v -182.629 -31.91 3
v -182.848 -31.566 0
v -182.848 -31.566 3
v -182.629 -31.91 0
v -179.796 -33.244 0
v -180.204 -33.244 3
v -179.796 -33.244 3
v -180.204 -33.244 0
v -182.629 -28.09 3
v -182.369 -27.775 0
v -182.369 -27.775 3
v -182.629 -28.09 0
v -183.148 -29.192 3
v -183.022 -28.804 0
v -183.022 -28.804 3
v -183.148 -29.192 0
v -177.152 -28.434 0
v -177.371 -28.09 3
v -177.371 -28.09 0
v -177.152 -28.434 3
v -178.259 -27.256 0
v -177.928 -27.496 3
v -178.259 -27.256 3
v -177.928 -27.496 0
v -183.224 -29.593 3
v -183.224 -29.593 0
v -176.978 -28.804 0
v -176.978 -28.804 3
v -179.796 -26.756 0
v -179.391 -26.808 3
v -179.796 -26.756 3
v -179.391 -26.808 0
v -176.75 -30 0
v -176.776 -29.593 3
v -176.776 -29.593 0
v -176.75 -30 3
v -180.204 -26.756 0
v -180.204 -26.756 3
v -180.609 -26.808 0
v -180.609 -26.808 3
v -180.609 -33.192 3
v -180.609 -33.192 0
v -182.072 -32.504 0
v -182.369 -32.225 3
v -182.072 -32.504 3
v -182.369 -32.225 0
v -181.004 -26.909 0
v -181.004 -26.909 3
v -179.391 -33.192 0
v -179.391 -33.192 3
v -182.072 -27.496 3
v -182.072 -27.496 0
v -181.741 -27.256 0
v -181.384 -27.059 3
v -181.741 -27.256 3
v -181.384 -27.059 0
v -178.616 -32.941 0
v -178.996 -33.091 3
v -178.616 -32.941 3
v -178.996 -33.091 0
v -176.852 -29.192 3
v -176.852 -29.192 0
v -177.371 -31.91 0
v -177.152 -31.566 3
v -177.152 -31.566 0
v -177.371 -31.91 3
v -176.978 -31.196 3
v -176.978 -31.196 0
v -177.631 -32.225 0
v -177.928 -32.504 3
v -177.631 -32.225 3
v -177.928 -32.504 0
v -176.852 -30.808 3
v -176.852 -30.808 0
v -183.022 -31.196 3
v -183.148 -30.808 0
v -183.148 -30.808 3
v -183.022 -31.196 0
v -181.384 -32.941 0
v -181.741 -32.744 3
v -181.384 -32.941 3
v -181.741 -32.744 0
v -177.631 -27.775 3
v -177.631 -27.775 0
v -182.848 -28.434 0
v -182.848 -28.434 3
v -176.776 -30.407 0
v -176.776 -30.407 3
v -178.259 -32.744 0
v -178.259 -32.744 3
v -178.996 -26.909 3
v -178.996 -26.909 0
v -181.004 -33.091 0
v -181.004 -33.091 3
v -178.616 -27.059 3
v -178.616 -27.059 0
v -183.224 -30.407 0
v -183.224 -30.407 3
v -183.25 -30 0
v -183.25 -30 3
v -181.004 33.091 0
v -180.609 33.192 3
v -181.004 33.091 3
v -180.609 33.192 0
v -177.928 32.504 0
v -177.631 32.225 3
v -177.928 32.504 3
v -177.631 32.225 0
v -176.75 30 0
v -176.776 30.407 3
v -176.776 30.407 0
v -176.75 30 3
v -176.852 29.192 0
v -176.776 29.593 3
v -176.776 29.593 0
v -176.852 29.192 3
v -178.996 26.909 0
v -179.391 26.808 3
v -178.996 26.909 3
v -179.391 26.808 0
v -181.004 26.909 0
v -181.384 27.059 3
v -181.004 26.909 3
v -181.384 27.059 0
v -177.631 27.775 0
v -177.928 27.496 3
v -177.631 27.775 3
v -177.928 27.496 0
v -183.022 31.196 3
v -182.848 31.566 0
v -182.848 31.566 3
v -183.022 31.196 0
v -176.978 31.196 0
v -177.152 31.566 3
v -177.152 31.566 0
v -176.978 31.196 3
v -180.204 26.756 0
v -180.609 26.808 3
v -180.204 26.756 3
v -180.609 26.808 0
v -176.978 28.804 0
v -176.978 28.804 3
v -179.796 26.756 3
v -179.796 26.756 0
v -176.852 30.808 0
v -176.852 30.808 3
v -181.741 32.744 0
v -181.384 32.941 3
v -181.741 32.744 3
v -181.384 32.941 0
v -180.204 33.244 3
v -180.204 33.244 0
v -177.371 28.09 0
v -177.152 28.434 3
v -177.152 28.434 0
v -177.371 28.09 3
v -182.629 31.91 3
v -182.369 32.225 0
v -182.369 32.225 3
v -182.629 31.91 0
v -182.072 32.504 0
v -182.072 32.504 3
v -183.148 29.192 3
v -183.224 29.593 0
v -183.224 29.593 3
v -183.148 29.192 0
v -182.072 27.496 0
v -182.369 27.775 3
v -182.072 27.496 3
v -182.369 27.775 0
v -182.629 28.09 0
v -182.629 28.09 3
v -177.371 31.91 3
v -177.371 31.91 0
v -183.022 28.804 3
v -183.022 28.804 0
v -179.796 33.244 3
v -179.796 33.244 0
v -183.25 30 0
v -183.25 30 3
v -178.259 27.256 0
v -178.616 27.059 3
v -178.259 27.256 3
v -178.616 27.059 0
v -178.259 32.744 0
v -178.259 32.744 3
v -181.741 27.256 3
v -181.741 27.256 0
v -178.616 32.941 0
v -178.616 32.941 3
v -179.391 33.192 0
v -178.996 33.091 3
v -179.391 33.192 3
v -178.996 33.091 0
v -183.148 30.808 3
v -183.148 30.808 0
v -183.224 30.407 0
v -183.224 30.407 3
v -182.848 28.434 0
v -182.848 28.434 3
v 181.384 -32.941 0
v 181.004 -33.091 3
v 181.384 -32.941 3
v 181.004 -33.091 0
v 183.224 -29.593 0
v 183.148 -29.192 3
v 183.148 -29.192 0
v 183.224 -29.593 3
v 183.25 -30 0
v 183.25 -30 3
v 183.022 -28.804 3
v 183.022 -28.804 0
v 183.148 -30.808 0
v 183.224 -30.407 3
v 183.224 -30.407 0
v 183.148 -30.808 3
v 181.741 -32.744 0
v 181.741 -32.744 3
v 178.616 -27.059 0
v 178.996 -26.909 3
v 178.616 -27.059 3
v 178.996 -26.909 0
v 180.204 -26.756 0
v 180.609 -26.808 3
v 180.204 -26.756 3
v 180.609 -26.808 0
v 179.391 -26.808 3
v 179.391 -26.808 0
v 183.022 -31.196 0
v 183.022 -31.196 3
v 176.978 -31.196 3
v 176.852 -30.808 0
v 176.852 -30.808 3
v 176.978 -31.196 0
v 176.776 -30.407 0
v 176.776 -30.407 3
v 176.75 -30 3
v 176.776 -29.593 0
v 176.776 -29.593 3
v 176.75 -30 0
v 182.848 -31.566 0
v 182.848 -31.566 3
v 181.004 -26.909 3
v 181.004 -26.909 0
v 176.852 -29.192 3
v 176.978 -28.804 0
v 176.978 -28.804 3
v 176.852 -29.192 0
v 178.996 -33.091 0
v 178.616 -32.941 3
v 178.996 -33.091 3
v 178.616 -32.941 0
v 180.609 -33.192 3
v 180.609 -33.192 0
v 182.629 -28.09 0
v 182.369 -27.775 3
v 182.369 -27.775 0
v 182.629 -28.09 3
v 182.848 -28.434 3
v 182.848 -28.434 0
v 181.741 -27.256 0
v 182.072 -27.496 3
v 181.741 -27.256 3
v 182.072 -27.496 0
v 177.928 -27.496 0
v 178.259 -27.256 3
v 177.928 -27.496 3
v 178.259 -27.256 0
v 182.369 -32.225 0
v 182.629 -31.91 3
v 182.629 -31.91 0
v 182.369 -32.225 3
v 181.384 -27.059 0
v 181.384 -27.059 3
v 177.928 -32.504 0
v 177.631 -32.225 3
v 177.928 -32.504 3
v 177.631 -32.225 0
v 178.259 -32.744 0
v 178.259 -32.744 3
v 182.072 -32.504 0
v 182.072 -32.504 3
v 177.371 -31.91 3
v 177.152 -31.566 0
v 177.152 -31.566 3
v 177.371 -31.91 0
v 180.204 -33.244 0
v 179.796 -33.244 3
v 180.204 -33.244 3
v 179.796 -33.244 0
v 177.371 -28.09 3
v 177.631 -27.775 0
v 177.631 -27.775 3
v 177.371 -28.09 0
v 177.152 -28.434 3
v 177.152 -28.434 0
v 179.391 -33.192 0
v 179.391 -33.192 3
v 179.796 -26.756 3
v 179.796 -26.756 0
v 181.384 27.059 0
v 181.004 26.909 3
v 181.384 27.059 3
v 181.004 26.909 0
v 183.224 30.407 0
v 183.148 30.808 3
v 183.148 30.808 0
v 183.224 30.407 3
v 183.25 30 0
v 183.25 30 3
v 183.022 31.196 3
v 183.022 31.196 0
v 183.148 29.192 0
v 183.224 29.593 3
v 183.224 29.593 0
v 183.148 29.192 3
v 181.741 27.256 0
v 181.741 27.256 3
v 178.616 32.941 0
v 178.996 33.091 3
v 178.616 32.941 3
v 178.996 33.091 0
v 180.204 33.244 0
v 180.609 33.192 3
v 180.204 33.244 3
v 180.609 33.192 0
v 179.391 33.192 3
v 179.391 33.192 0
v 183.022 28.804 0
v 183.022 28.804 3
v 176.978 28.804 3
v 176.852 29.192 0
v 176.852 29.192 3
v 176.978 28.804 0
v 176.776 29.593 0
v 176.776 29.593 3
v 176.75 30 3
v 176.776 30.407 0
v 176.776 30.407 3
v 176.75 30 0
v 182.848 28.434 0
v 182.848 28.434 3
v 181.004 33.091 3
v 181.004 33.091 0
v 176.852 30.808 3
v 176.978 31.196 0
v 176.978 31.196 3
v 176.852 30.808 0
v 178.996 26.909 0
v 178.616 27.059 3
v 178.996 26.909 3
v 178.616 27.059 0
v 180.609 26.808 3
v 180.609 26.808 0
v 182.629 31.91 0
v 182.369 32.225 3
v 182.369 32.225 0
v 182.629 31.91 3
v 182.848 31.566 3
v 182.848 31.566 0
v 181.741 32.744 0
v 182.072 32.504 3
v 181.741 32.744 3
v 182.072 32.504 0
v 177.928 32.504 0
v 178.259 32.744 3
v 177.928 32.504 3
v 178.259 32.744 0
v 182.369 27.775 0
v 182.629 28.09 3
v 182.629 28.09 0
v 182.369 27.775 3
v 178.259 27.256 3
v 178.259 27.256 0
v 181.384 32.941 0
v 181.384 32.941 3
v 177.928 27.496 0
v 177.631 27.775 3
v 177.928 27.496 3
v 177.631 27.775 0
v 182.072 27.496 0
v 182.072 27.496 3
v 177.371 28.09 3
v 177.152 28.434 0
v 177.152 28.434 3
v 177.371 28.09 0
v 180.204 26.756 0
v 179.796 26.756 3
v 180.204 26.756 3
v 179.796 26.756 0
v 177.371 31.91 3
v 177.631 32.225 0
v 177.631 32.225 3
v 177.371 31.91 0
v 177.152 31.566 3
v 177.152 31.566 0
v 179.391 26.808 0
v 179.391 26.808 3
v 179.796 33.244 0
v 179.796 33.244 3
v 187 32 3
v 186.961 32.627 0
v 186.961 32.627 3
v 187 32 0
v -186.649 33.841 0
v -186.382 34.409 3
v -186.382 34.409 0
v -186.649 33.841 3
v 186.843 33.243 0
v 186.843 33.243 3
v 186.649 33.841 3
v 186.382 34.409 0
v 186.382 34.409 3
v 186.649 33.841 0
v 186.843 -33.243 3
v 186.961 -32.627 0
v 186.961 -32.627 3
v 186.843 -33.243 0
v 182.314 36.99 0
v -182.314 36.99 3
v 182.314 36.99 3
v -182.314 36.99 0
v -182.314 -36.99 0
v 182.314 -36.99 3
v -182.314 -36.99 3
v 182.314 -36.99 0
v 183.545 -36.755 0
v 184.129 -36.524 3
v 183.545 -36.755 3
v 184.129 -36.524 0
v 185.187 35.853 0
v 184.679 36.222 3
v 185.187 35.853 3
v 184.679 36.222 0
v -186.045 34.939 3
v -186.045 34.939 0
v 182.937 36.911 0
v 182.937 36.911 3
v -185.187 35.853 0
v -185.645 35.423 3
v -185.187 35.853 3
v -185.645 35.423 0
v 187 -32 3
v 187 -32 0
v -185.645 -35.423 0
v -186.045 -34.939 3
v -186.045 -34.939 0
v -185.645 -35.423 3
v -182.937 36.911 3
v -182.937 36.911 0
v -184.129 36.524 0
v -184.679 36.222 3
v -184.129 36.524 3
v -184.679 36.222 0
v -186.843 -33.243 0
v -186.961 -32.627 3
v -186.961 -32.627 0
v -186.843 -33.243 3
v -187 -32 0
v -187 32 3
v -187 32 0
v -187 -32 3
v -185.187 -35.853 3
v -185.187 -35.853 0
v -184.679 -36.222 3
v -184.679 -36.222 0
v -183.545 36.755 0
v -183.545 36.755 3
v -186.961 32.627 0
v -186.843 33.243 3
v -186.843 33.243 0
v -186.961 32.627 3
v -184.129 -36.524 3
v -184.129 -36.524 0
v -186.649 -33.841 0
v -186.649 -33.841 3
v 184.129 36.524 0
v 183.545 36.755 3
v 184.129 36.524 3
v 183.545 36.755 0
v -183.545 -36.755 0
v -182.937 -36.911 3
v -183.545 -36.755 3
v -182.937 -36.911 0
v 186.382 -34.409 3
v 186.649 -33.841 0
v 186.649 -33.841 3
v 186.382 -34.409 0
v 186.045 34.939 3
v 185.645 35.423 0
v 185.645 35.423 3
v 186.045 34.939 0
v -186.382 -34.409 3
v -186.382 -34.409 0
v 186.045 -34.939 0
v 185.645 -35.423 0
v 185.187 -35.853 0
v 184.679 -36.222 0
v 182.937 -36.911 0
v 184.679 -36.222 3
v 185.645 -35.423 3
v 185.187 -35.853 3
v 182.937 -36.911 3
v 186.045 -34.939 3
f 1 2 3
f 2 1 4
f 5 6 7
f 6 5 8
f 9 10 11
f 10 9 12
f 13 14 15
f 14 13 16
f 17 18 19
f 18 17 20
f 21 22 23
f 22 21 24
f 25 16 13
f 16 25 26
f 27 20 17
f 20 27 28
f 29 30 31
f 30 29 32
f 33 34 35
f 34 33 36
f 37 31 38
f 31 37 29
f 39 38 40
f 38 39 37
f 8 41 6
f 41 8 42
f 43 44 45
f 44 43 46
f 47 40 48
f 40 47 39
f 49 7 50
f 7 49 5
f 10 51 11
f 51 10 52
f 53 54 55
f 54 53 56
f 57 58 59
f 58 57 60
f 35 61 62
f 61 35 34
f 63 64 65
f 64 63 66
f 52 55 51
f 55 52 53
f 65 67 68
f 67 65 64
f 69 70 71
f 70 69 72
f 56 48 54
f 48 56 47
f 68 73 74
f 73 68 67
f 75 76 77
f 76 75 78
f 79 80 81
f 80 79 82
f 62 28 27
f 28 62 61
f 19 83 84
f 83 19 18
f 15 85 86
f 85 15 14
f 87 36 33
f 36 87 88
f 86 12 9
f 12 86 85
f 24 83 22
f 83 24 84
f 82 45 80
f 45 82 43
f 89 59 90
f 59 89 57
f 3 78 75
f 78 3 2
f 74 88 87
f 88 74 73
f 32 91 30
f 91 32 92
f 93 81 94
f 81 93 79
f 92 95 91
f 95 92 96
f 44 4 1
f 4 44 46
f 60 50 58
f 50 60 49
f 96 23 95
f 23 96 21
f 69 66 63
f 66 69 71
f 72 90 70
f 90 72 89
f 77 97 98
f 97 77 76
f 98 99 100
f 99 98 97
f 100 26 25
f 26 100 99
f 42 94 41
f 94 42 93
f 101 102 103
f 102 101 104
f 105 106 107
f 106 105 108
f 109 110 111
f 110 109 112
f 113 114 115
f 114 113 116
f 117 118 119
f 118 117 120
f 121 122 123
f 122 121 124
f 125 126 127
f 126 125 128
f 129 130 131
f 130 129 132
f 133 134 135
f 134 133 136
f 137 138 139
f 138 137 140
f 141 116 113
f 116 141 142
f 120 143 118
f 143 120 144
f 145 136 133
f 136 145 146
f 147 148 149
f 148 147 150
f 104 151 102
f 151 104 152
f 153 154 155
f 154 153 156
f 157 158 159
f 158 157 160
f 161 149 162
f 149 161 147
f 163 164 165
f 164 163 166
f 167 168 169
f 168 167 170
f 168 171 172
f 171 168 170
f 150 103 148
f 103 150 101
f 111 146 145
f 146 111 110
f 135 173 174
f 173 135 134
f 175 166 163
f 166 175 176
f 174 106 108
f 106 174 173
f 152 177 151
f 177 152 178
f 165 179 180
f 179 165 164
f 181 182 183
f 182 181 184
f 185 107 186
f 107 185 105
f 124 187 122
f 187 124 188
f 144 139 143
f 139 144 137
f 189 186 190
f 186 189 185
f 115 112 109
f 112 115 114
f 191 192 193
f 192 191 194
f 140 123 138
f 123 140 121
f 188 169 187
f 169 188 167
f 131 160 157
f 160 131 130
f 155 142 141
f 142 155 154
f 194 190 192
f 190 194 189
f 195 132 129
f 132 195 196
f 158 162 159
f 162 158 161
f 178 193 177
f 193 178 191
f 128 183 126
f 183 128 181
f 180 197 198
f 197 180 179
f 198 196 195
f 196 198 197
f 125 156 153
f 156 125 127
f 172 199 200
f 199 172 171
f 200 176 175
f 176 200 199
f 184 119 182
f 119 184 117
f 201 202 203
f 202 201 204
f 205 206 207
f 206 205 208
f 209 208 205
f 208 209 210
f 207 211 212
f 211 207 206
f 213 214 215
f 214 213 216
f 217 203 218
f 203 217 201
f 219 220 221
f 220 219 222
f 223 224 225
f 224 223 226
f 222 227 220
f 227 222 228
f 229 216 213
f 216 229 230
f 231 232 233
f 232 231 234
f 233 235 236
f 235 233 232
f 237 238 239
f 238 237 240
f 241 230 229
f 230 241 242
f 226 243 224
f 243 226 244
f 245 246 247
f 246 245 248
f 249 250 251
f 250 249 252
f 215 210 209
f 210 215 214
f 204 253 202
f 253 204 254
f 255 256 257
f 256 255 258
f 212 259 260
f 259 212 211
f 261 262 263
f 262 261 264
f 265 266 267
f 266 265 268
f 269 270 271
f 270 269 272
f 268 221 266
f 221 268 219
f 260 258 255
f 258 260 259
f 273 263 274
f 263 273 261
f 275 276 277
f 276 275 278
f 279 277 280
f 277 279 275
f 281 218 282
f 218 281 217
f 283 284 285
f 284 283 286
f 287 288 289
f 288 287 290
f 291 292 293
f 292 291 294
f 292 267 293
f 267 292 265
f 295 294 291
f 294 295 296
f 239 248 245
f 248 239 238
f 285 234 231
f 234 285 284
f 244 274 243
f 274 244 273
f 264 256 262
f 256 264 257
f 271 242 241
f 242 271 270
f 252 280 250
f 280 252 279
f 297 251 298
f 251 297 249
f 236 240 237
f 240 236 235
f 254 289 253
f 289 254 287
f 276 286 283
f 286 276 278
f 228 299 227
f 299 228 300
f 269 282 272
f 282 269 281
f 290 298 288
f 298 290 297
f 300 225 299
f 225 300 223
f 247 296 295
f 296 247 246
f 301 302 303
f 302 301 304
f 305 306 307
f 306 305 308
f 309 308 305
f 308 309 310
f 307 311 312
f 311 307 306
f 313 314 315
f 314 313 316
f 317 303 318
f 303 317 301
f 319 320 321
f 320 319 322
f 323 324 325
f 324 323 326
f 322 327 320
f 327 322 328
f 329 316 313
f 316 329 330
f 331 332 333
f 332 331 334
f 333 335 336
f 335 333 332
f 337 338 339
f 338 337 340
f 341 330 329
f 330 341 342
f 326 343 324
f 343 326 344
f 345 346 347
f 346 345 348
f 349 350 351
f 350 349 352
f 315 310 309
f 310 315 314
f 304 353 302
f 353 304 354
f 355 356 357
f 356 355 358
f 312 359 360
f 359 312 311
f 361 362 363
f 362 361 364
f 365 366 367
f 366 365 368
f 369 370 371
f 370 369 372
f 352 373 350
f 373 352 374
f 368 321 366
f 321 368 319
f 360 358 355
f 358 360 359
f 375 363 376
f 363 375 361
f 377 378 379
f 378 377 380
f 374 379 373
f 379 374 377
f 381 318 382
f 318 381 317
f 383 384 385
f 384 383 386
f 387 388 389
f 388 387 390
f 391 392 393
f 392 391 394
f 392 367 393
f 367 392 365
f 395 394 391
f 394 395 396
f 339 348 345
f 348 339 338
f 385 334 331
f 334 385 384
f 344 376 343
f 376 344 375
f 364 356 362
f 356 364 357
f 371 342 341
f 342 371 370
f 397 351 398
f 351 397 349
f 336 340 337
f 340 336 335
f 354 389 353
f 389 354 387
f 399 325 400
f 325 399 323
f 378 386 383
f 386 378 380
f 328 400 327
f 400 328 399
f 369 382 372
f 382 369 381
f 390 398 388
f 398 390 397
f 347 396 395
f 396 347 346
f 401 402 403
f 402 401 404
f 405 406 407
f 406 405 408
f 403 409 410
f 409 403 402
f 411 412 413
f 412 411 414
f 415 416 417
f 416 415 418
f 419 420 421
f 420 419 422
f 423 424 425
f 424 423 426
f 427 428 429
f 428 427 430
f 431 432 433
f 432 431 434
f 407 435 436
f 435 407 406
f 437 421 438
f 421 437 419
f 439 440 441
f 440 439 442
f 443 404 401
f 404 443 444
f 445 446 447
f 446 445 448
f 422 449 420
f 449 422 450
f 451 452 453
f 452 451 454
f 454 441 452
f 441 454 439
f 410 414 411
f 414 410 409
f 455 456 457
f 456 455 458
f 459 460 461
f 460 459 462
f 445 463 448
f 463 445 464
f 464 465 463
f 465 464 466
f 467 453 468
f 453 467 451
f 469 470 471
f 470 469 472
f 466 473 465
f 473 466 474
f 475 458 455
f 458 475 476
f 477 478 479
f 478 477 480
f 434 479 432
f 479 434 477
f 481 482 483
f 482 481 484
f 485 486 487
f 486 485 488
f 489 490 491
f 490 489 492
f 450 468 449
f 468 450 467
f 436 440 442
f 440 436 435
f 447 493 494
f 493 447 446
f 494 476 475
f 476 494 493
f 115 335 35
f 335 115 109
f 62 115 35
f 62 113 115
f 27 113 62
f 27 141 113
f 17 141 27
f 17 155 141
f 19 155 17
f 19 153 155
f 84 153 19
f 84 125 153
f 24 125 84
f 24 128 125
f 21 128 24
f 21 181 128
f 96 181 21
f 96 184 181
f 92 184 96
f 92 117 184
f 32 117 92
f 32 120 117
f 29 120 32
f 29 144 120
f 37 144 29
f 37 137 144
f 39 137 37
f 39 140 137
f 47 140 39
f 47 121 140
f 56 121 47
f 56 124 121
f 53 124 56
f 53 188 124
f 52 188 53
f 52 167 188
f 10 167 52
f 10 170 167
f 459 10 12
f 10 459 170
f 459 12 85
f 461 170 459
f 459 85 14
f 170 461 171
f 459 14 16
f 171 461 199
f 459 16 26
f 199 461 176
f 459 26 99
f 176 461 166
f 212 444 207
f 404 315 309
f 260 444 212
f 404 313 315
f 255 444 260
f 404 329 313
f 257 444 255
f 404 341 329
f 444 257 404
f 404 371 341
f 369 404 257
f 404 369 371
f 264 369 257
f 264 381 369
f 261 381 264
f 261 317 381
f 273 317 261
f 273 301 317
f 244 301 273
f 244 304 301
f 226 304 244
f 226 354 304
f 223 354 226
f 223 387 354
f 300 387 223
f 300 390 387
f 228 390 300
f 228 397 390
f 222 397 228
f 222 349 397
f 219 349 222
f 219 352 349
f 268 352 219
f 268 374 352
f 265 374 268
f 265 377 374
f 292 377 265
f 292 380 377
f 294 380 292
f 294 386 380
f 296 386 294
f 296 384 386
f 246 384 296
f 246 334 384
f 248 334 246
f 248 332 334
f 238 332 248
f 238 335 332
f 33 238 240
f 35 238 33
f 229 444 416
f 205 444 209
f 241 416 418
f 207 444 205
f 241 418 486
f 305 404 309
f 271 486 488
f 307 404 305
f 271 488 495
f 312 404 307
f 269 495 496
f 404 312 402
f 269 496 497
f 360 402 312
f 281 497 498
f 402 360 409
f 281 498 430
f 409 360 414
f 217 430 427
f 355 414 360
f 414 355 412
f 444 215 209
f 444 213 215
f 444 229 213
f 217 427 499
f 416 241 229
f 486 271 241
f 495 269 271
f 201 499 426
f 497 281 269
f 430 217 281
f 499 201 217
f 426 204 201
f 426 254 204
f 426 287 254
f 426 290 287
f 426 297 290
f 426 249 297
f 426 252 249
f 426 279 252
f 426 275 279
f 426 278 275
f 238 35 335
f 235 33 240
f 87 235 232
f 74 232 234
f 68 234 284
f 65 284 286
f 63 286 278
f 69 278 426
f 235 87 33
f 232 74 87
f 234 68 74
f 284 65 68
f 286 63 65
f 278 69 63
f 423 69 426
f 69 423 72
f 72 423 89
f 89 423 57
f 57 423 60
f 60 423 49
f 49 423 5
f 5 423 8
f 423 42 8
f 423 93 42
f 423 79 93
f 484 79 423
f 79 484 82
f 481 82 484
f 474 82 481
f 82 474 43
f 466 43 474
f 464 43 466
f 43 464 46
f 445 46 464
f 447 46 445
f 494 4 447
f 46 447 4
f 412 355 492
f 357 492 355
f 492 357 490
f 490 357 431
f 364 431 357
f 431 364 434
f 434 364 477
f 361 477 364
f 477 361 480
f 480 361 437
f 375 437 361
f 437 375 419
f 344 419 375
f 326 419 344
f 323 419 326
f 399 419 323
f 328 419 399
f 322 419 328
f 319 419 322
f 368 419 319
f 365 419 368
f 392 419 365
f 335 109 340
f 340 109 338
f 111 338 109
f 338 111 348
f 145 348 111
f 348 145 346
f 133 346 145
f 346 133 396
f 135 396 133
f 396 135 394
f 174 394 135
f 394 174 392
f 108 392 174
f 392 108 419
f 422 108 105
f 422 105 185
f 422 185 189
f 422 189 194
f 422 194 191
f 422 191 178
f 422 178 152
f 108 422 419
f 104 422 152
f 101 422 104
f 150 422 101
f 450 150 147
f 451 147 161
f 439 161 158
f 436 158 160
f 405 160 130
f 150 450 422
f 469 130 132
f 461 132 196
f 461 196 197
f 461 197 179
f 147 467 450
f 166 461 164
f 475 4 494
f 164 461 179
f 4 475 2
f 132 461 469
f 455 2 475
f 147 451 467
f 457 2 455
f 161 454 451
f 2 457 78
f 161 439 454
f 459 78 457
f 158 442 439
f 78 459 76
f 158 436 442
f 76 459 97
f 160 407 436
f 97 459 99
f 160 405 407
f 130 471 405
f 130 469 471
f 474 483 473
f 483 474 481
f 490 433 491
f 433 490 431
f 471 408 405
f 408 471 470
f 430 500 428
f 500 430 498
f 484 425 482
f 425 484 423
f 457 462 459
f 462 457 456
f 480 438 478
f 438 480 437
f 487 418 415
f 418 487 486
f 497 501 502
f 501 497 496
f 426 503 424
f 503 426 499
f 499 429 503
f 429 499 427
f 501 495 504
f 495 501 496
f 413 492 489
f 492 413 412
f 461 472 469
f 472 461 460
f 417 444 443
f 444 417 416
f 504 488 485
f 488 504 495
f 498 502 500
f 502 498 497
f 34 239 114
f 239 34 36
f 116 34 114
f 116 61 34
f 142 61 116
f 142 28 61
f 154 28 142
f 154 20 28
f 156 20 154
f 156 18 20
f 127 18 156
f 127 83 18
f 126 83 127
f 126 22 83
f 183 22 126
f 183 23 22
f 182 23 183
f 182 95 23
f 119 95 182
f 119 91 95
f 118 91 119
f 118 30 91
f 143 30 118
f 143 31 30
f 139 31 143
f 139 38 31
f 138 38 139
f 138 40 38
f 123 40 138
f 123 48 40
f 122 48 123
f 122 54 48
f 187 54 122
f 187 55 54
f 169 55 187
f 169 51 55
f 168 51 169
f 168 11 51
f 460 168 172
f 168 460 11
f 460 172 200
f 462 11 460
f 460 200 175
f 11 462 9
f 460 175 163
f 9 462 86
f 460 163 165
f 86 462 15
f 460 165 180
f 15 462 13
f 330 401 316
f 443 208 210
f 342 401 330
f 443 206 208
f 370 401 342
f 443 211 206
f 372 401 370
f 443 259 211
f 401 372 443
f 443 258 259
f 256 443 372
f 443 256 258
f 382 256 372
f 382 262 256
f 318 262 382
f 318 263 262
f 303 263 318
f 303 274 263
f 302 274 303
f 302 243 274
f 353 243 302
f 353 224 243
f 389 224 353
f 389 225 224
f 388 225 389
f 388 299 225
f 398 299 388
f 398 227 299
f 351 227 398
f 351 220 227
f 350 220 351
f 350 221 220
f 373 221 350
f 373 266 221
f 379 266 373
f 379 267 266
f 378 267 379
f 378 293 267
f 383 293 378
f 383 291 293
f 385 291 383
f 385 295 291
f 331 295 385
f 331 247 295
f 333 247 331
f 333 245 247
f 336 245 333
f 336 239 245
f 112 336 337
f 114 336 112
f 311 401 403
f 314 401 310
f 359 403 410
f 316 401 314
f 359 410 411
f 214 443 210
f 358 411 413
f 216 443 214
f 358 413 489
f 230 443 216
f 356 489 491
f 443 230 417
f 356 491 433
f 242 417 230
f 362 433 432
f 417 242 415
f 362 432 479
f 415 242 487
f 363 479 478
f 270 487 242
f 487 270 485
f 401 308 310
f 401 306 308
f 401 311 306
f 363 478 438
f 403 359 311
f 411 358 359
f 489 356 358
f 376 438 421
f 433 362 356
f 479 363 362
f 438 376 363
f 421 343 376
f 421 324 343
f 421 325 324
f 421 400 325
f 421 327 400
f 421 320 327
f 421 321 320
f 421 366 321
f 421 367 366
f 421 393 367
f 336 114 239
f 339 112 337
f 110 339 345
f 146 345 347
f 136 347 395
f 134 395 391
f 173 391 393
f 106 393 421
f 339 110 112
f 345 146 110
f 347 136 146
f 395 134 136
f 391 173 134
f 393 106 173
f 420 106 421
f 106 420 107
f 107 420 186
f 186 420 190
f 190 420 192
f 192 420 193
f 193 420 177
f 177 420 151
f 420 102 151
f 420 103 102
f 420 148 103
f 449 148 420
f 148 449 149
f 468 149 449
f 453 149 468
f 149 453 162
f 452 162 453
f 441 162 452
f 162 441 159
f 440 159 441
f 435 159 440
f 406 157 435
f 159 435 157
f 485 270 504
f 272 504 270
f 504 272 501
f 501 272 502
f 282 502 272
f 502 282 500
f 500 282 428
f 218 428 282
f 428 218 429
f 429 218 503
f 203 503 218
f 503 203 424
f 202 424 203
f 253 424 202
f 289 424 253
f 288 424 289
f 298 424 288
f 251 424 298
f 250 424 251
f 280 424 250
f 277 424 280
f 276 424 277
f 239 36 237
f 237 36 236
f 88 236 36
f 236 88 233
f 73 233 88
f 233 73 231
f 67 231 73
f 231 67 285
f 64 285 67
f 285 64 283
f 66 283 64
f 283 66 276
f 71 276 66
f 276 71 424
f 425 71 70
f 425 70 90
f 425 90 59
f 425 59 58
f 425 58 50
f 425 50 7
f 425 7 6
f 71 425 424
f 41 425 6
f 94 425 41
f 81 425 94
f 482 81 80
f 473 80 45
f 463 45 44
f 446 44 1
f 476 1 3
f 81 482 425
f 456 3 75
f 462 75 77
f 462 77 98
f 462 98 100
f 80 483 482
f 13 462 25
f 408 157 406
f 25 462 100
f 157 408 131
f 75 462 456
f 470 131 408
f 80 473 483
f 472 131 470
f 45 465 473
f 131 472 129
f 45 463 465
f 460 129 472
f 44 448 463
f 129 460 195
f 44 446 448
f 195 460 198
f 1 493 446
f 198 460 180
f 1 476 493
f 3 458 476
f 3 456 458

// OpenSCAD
$fn = 50;


difference() {
	union() {
		hull() {
			translate(v = [-182.0000000000, 32.0000000000, 0]) {
				cylinder(h = 3, r = 5);
			}
			translate(v = [182.0000000000, 32.0000000000, 0]) {
				cylinder(h = 3, r = 5);
			}
			translate(v = [-182.0000000000, -32.0000000000, 0]) {
				cylinder(h = 3, r = 5);
			}
			translate(v = [182.0000000000, -32.0000000000, 0]) {
				cylinder(h = 3, r = 5);
			}
		}
	}
	union() {
		translate(v = [-180.0000000000, -30.0000000000, -100.0000000000]) {
			cylinder(h = 200, r = 3.2500000000);
		}
		translate(v = [-180.0000000000, 30.0000000000, -100.0000000000]) {
			cylinder(h = 200, r = 3.2500000000);
		}
		translate(v = [180.0000000000, -30.0000000000, -100.0000000000]) {
			cylinder(h = 200, r = 3.2500000000);
		}
		translate(v = [180.0000000000, 30.0000000000, -100.0000000000]) {
			cylinder(h = 200, r = 3.2500000000);
		}
	}
}
